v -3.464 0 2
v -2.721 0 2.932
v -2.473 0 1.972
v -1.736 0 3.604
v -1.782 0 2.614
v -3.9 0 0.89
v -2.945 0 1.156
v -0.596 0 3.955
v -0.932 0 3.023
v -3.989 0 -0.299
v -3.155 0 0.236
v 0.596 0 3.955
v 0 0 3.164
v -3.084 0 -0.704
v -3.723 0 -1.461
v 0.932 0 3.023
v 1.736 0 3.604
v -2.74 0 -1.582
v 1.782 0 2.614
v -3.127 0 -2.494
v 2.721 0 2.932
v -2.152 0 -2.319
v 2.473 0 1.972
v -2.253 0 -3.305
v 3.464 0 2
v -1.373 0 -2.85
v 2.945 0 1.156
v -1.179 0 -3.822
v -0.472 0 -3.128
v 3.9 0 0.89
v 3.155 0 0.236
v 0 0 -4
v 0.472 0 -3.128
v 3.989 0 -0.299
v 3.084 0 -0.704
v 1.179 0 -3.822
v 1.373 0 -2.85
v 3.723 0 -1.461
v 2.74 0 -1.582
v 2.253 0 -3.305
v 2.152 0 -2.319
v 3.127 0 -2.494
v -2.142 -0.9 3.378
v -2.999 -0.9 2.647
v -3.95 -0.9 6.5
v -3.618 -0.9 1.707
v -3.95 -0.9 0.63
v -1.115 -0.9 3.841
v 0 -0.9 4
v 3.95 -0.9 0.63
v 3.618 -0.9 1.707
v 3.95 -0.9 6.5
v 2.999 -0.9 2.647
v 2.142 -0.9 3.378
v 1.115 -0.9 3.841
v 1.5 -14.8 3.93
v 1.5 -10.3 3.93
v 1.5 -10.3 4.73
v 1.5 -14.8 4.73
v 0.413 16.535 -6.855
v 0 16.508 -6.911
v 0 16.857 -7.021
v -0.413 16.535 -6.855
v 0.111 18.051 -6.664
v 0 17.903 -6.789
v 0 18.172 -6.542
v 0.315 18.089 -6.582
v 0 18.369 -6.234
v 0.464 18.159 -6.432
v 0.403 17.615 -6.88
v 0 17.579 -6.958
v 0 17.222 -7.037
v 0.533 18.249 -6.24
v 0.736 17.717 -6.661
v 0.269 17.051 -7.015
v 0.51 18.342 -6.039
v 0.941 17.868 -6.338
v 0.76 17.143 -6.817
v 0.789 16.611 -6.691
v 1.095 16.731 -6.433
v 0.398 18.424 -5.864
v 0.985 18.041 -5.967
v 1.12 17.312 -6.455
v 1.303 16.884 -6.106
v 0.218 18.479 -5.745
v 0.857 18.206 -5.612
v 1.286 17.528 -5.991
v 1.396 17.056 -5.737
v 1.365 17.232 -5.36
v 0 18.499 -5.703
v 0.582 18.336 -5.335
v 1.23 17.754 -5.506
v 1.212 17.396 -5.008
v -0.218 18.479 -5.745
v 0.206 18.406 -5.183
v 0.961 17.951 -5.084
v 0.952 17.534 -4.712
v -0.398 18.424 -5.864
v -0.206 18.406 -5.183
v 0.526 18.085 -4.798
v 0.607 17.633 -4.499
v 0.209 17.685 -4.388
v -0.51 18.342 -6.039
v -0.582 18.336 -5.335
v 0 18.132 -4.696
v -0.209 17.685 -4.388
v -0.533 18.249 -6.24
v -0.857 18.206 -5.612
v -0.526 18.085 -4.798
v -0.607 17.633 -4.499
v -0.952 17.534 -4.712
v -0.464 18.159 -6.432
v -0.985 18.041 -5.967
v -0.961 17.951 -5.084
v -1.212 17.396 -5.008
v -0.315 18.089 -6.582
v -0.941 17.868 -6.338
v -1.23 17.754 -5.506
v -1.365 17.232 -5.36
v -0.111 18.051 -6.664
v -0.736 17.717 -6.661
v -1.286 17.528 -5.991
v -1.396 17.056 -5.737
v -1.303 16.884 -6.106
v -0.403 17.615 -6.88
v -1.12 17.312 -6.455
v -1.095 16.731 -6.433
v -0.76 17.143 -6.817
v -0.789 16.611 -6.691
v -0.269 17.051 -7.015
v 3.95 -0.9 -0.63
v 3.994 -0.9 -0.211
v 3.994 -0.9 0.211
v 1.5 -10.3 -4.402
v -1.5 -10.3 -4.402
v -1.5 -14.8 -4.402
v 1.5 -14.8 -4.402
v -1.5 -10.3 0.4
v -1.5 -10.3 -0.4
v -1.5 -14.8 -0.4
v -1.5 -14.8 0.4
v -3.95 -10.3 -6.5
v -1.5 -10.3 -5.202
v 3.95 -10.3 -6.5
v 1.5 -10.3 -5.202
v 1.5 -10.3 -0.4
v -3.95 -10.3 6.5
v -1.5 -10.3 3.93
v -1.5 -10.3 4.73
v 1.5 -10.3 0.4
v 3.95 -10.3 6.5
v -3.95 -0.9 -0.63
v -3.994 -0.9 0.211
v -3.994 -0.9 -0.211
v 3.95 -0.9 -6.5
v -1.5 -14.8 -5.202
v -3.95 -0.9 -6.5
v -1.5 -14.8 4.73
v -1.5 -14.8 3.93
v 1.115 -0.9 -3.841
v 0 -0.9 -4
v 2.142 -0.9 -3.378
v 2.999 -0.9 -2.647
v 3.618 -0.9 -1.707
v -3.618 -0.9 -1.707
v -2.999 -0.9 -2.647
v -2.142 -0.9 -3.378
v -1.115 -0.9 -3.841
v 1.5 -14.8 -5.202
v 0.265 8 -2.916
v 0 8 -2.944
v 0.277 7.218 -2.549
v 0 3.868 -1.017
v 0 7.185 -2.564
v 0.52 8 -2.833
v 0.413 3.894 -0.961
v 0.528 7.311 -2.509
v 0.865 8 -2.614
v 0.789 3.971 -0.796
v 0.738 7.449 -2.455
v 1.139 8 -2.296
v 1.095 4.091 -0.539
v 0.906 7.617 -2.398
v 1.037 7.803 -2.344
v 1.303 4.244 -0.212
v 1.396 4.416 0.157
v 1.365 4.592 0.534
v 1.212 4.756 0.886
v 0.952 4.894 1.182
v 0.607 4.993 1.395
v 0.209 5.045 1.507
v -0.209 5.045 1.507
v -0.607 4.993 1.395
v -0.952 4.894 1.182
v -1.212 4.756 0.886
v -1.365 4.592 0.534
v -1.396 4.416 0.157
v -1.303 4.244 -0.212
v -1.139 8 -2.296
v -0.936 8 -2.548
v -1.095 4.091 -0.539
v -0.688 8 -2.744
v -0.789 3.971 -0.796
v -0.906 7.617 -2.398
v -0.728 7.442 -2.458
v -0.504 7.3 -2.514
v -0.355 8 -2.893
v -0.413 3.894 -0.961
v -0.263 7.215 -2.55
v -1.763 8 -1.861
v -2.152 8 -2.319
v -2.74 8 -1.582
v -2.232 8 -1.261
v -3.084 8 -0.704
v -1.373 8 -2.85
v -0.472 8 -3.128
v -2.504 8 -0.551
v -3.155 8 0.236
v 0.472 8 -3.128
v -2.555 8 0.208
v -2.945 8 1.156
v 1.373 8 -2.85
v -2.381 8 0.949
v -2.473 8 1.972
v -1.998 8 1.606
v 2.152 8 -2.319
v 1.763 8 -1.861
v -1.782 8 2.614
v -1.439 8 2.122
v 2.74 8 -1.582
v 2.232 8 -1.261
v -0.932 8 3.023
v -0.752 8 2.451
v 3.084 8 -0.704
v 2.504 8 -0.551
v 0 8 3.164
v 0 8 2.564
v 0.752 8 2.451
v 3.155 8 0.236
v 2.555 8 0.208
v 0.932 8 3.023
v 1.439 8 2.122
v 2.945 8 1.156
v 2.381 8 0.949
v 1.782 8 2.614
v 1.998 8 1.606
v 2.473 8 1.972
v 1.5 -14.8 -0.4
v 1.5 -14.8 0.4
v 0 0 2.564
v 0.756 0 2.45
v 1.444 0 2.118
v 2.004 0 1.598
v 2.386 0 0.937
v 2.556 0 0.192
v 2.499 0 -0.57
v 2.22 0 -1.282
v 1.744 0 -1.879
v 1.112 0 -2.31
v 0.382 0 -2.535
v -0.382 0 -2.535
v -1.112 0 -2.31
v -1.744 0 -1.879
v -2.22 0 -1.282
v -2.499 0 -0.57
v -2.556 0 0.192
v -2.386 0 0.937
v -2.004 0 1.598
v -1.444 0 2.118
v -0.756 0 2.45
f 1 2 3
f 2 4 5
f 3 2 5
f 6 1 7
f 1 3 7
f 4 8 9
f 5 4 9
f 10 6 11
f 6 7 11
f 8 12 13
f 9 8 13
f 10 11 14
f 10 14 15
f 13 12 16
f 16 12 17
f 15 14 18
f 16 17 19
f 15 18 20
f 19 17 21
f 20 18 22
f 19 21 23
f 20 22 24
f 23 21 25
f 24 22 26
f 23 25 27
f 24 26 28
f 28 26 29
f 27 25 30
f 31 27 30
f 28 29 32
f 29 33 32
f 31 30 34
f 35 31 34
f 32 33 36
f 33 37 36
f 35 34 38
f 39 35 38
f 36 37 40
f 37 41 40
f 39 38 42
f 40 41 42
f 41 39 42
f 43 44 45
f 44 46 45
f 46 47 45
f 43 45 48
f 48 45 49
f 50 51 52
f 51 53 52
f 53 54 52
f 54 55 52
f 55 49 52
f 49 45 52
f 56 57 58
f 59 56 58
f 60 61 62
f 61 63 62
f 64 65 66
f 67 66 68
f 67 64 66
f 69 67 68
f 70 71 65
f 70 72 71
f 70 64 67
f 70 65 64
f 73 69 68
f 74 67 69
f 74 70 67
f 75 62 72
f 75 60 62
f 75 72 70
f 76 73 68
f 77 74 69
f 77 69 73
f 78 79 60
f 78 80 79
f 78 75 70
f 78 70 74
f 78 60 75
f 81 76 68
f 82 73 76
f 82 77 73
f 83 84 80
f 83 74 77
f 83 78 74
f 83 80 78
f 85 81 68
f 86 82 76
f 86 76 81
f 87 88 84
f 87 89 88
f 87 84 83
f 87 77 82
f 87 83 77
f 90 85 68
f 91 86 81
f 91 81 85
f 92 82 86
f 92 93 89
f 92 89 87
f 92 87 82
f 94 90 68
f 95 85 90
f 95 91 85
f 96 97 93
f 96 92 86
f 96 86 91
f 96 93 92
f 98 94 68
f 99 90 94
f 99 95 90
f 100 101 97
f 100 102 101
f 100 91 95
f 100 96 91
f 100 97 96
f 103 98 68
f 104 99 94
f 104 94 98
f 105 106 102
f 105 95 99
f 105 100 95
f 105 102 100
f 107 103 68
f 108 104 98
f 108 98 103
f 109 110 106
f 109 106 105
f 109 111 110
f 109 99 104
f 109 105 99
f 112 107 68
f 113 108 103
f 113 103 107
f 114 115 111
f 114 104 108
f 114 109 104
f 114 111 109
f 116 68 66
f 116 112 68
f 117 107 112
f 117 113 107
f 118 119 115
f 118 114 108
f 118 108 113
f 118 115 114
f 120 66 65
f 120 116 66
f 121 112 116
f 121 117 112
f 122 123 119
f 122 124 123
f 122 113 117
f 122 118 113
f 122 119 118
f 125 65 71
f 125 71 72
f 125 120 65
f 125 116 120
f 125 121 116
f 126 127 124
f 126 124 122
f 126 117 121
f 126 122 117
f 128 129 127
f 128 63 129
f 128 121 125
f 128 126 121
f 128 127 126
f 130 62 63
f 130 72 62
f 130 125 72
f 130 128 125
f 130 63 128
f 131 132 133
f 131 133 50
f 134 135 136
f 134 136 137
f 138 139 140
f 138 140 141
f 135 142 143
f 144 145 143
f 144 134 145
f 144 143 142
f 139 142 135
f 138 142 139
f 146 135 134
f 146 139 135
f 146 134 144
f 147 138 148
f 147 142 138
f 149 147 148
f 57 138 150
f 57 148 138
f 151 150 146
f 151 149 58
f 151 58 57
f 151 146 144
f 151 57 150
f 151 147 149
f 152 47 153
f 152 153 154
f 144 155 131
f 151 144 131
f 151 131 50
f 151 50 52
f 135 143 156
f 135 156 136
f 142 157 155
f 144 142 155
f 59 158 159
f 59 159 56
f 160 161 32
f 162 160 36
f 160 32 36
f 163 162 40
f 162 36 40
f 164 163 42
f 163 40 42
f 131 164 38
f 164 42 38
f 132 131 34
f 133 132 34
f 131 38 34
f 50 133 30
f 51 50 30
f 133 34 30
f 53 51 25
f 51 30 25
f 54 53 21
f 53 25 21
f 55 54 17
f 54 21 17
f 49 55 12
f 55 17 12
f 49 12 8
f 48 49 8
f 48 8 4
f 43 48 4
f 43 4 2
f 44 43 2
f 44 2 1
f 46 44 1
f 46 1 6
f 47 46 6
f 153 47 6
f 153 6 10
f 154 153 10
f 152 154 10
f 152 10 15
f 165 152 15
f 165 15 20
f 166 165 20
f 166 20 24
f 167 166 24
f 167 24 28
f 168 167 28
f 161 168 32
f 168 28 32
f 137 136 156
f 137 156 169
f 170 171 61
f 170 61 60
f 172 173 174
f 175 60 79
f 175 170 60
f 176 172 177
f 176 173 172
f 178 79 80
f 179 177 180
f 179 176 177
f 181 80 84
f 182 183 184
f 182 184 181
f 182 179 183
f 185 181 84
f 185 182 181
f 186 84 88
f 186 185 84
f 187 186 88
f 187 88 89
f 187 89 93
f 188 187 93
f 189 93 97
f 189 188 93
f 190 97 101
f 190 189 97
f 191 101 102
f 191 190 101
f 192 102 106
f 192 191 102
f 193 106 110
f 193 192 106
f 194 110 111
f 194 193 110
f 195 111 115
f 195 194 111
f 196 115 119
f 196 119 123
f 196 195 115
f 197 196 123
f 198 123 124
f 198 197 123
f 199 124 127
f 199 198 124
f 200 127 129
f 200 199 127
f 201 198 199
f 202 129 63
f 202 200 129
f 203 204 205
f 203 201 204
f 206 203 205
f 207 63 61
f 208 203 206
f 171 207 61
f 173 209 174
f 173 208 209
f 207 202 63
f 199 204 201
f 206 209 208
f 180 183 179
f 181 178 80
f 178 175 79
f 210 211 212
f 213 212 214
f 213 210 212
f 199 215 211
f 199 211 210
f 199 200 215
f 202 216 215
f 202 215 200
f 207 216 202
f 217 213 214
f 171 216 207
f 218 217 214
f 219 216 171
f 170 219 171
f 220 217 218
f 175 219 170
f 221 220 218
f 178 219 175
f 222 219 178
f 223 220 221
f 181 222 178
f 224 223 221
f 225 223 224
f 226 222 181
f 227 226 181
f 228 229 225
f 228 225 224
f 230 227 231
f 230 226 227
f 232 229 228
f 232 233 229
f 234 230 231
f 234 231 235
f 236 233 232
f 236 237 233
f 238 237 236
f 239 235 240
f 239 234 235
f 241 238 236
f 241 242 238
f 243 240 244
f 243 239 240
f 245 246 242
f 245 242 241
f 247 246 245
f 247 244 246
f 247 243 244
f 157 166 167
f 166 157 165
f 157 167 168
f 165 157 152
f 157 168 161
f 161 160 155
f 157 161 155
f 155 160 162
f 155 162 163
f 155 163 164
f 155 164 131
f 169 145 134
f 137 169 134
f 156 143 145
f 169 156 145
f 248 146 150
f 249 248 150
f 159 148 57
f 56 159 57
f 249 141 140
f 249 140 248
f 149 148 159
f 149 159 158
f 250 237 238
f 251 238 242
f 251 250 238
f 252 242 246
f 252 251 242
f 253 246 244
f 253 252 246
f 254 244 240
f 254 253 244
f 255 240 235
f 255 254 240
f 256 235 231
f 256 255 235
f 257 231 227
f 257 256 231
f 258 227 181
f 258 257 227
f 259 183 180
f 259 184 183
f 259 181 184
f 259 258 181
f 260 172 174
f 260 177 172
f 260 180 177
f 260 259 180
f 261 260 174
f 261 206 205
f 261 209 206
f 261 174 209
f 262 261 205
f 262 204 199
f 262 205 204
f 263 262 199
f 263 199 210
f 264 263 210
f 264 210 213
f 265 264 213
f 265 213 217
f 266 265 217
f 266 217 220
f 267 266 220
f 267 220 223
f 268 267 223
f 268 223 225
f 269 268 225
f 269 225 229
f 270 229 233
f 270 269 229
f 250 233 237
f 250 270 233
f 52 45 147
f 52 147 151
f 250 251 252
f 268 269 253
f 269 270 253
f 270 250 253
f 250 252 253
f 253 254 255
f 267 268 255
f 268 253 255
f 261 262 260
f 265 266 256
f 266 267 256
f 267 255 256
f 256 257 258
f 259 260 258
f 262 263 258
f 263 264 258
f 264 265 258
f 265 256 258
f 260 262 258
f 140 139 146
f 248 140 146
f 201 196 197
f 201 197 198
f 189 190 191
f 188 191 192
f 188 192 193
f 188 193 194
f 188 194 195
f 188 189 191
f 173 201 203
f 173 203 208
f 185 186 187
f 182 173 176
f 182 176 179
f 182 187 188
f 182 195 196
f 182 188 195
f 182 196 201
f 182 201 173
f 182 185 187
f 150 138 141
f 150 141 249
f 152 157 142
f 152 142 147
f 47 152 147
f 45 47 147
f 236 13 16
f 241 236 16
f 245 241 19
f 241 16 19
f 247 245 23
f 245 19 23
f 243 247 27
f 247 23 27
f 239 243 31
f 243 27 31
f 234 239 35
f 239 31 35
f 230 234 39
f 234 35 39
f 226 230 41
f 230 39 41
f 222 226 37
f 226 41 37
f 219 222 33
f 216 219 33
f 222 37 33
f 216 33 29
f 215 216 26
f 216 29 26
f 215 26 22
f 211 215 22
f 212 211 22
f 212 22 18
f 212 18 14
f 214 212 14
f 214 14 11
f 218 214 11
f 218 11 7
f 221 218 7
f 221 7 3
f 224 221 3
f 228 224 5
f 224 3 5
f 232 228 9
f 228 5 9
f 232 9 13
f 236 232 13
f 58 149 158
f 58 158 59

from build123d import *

# Parameters (mm, degrees)
SKETCH1_R           = 3.16357
SKETCH1_R_2         = 2.56357
BOSS_EXTRUDE1_DEPTH = 8
SKETCH2_R           = 4
BOSS_EXTRUDE2_DEPTH = 0.9
SKETCH3_W           = 7.9
SKETCH3_H           = 13
BOSS_EXTRUDE3_DEPTH = 9.4
SKETCH4_W           = 3
SKETCH4_H           = 0.8
BOSS_EXTRUDE4_DEPTH = 4.5


with BuildPart() as part:
    # Sketch1 → Boss-Extrude1 (new body)
    with BuildSketch(Plane(origin=(0, 0, 0), x_dir=(1, 0, 0), z_dir=(0, 1, 0))):
        with Locations(Location((0, 0, 0), (0, 0, 270))):
            Circle(SKETCH1_R)
        with Locations(Location((0, 0, 0), (0, 0, 270))):
            Circle(SKETCH1_R_2, mode=Mode.SUBTRACT)
    extrude(amount=BOSS_EXTRUDE1_DEPTH)

    # Sketch2 → Boss-Extrude2 (add)
    with BuildSketch(Plane.XZ):
        with Locations(Location((0, 0, 0), (0, 0, 270))):
            Circle(SKETCH2_R)
    extrude(amount=BOSS_EXTRUDE2_DEPTH)

    # Sketch3 → Boss-Extrude3 (add)
    with BuildSketch(Plane.XZ.offset(0.9)):
        Rectangle(SKETCH3_W, SKETCH3_H)
    extrude(amount=BOSS_EXTRUDE3_DEPTH)

    # Sketch4 → Boss-Extrude4 (add)
    with BuildSketch(Plane.XZ.offset(10.3)):
        with Locations((0, 4.330352395)):
            Rectangle(SKETCH4_W, SKETCH4_H)
        Rectangle(SKETCH4_W, SKETCH4_H)
        with Locations((0, -4.801802051)):
            Rectangle(SKETCH4_W, SKETCH4_H)
    extrude(amount=BOSS_EXTRUDE4_DEPTH)

    # Sketch5 → Revolve1 (revolve)
    with BuildSketch(Plane(origin=(0, 0, 0), x_dir=(0, 0, -1), z_dir=(1, 0, 0)), mode=Mode.PRIVATE) as revolve1_sk:
        with BuildLine():
            Line((4.373491762, 17.691665566), (-1.520701627, 5.051527053))
            Line((-1.520701627, 5.051527053), (-0.251870725, 4.459861486))
            Line((-0.251870725, 4.459861486), (6.23398823, 18.368830902))
            ThreePointArc((6.23398823, 18.368830902), (5.163494463, 18.415569669), (4.373491762, 17.691665566))
        make_face()
    revolve(revolve1_sk.sketch.rotate(Axis((0, 15.555621566, -4.922167173), (0, -0.9063077870366496, 0.4226182617407002)), 180), axis=Axis((0, 15.555621566, -4.922167173), (0, -0.9063077870366496, 0.4226182617407002)))


solid = part.part
